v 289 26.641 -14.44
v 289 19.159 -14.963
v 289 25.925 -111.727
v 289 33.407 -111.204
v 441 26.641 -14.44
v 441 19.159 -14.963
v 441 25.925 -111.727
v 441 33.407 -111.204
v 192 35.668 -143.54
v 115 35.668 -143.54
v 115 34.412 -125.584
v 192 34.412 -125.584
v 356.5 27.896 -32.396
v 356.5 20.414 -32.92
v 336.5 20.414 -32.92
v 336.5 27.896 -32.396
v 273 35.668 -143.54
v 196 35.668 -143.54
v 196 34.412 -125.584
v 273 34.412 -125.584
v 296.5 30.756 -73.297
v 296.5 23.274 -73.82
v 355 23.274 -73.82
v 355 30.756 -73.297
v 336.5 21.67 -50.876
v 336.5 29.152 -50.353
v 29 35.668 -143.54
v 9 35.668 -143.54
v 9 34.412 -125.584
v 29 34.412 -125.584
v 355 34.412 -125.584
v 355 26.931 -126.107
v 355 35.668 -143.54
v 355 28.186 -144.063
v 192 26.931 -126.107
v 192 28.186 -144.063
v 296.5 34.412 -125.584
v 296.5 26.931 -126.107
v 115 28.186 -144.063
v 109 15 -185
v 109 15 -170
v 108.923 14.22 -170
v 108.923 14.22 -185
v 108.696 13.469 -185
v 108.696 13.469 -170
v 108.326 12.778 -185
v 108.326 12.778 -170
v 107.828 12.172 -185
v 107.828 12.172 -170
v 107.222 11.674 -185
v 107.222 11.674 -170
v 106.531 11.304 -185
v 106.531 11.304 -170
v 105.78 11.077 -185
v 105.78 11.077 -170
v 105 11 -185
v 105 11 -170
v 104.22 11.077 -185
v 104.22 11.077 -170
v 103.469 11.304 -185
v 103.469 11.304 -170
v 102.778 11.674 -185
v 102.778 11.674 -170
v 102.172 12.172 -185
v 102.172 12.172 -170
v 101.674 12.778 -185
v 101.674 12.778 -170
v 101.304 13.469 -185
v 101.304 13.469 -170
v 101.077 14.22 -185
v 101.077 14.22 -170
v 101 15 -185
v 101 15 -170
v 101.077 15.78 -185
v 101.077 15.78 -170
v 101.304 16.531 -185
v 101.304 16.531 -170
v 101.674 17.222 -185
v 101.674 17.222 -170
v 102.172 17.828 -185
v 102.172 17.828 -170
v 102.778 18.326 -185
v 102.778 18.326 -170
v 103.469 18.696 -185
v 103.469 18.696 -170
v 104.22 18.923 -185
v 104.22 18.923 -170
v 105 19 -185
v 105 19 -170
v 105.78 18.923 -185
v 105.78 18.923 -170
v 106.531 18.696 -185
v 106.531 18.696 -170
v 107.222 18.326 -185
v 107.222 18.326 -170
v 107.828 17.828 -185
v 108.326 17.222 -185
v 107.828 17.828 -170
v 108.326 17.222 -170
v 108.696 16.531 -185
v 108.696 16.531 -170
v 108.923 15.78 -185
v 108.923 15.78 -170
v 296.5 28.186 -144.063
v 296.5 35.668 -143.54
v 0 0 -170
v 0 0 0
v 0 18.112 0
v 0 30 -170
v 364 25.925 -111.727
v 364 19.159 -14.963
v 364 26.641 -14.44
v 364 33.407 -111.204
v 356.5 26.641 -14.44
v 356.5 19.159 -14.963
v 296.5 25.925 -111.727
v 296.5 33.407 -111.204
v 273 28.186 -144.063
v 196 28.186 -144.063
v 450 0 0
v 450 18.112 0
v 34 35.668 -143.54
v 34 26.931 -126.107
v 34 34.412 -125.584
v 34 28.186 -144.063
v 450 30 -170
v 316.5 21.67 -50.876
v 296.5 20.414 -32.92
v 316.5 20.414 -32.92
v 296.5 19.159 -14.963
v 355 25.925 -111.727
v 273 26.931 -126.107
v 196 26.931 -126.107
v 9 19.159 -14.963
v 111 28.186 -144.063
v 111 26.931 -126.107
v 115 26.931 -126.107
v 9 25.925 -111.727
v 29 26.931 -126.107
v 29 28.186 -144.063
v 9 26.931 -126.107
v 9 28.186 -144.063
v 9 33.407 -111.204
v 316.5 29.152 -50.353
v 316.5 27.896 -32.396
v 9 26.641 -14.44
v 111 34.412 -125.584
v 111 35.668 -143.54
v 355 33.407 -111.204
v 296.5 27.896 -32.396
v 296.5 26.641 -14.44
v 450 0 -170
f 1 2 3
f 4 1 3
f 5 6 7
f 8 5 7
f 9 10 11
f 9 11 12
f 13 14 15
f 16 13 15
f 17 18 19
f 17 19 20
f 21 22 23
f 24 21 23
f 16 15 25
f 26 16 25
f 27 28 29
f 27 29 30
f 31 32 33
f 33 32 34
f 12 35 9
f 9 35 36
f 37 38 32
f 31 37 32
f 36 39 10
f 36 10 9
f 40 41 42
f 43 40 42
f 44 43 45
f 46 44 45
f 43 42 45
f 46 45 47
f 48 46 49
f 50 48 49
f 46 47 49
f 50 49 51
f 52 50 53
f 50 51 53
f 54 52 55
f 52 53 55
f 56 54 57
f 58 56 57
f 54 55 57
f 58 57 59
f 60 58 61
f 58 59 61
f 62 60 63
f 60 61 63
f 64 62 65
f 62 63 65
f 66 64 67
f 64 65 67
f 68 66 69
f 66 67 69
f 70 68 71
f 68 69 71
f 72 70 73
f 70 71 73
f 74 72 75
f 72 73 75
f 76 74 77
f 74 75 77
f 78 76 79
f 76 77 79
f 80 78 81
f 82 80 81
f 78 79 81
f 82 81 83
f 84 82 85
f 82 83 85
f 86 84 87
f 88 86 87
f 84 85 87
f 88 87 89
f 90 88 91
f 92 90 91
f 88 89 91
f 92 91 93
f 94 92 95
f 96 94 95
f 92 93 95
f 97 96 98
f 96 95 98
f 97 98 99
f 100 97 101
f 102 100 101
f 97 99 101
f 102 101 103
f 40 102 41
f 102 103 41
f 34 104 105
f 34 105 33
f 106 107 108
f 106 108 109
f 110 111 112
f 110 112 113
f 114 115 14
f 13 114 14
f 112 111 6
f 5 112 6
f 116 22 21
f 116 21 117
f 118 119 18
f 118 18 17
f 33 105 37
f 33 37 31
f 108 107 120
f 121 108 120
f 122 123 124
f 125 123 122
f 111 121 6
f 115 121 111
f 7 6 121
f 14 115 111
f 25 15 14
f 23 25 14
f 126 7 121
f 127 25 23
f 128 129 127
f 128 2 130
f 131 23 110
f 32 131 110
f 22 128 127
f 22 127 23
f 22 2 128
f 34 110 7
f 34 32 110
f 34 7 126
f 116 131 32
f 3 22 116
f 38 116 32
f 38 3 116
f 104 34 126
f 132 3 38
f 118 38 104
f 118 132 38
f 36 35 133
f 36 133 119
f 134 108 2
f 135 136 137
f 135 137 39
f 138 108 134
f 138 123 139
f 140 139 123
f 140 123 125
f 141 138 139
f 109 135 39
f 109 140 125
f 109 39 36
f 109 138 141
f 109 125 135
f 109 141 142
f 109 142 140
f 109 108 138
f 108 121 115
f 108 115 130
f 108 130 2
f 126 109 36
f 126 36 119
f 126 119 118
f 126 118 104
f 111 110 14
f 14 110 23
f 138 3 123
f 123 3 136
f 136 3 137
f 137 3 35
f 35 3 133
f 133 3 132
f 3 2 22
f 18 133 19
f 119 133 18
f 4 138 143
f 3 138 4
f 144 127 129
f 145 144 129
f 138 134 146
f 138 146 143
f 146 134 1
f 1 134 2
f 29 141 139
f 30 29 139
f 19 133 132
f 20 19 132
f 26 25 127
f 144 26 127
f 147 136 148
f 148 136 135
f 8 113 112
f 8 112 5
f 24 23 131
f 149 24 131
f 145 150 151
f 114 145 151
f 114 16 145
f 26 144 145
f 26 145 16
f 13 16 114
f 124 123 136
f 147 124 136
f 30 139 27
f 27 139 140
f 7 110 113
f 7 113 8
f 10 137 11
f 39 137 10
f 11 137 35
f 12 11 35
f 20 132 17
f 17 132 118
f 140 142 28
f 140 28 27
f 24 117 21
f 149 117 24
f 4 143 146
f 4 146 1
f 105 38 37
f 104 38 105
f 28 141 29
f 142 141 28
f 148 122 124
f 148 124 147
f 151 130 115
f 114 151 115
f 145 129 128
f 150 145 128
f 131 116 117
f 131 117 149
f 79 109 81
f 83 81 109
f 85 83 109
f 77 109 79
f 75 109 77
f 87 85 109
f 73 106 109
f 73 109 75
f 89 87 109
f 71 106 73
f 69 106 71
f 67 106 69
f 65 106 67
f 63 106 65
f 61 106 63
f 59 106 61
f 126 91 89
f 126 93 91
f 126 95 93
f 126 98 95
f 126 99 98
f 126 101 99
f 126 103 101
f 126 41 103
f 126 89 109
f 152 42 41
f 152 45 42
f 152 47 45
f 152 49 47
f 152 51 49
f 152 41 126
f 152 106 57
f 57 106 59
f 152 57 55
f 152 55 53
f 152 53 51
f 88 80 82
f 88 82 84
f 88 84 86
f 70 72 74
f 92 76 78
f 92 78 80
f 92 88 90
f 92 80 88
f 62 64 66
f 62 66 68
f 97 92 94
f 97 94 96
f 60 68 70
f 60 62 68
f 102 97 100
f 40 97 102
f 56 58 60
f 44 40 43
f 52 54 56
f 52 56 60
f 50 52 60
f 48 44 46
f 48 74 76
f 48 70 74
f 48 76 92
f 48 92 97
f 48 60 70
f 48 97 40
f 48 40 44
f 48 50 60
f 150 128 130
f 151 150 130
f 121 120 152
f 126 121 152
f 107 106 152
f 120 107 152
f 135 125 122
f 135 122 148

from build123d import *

# Parameters (mm, degrees)
SKETCH1_W           = 450
SKETCH1_H           = 170
BOSS_EXTRUDE1_DEPTH = 30
CHAMFER1_SIZE       = 11.88755803
CHAMFER1_SIZE_2     = 170
SKETCH2_R           = 4
BOSS_EXTRUDE2_DEPTH = 15
SKETCH3_W           = 280
SKETCH3_H           = 97
SKETCH3_W_2         = 20
SKETCH3_H_2         = 18
SKETCH3_W_3         = 77
SKETCH3_W_4         = 58.5
SKETCH3_H_3         = 38
BOSS_EXTRUDE3_DEPTH = 7.5


with BuildPart() as part:
    # Sketch1 → Boss-Extrude1 (new body)
    with BuildSketch(Plane(origin=(0, 0, 0), x_dir=(1, 0, 0), z_dir=(0, 1, 0))):
        with Locations((225, 85)):
            Rectangle(SKETCH1_W, SKETCH1_H)
    extrude(amount=BOSS_EXTRUDE1_DEPTH)

    # Chamfer1
    # the kernel refuses this chamfer: 170, 11.88755803 mm, written as the material it takes off along each edge
    with BuildSketch(Plane(origin=(-441.960179797, 30, 0), x_dir=(0, -0.8766829747338916, 0.48106856248536445), z_dir=(1, 0, 0))) as chamfer1_piece_1:
        Polygon((CHAMFER1_SIZE * 0.876682974763, CHAMFER1_SIZE * 0.481068562501), (-CHAMFER1_SIZE_2 * 0.481068562485, CHAMFER1_SIZE_2 * 0.876682974734), (0, 0), align=None)
    extrude(amount=1333.920359594, mode=Mode.SUBTRACT)

    # Sketch2 → Boss-Extrude2 (add)
    with BuildSketch(Plane(origin=(0, 0, -170), x_dir=(-1, 0, 0), z_dir=(0, 0, -1))):
        with Locations(Location((-105, 15, 0), (0, 0, 180))):
            Circle(SKETCH2_R)
    extrude(amount=BOSS_EXTRUDE2_DEPTH)

    # Sketch3 → Boss-Extrude3 (add)
    with BuildSketch(Plane(origin=(0, 18.02430745, 1.260382357), x_dir=(1, 0, 0), z_dir=(0, 0.9975640502598245, 0.06975647374412289))):
        Polygon((296.5, 16.263460083), (356.5, 16.263460083), (356.5, 34.263460083), (336.5, 34.263460083), (336.5, 52.263460083), (316.5, 52.263460083), (316.5, 34.263460083), (296.5, 34.263460083), align=None)
        with Locations((149, 64.763460083)):
            Rectangle(SKETCH3_W, SKETCH3_H)
        with Locations((19, 136.678582756)):
            Rectangle(SKETCH3_W_2, SKETCH3_H_2)
        with Locations((72.5, 136.678582756)):
            Rectangle(SKETCH3_W_3, SKETCH3_H_2)
        with Locations((153.5, 136.678582756)):
            Rectangle(SKETCH3_W_3, SKETCH3_H_2)
        with Locations((234.5, 136.678582756)):
            Rectangle(SKETCH3_W_3, SKETCH3_H_2)
        with Locations((325.75, 136.678582756)):
            Rectangle(SKETCH3_W_4, SKETCH3_H_2)
        with Locations((325.75, 94.263460083)):
            Rectangle(SKETCH3_W_4, SKETCH3_H_3)
        with Locations((402.5, 64.763460083)):
            Rectangle(SKETCH3_W_3, SKETCH3_H)
    extrude(amount=BOSS_EXTRUDE3_DEPTH)


solid = part.part
